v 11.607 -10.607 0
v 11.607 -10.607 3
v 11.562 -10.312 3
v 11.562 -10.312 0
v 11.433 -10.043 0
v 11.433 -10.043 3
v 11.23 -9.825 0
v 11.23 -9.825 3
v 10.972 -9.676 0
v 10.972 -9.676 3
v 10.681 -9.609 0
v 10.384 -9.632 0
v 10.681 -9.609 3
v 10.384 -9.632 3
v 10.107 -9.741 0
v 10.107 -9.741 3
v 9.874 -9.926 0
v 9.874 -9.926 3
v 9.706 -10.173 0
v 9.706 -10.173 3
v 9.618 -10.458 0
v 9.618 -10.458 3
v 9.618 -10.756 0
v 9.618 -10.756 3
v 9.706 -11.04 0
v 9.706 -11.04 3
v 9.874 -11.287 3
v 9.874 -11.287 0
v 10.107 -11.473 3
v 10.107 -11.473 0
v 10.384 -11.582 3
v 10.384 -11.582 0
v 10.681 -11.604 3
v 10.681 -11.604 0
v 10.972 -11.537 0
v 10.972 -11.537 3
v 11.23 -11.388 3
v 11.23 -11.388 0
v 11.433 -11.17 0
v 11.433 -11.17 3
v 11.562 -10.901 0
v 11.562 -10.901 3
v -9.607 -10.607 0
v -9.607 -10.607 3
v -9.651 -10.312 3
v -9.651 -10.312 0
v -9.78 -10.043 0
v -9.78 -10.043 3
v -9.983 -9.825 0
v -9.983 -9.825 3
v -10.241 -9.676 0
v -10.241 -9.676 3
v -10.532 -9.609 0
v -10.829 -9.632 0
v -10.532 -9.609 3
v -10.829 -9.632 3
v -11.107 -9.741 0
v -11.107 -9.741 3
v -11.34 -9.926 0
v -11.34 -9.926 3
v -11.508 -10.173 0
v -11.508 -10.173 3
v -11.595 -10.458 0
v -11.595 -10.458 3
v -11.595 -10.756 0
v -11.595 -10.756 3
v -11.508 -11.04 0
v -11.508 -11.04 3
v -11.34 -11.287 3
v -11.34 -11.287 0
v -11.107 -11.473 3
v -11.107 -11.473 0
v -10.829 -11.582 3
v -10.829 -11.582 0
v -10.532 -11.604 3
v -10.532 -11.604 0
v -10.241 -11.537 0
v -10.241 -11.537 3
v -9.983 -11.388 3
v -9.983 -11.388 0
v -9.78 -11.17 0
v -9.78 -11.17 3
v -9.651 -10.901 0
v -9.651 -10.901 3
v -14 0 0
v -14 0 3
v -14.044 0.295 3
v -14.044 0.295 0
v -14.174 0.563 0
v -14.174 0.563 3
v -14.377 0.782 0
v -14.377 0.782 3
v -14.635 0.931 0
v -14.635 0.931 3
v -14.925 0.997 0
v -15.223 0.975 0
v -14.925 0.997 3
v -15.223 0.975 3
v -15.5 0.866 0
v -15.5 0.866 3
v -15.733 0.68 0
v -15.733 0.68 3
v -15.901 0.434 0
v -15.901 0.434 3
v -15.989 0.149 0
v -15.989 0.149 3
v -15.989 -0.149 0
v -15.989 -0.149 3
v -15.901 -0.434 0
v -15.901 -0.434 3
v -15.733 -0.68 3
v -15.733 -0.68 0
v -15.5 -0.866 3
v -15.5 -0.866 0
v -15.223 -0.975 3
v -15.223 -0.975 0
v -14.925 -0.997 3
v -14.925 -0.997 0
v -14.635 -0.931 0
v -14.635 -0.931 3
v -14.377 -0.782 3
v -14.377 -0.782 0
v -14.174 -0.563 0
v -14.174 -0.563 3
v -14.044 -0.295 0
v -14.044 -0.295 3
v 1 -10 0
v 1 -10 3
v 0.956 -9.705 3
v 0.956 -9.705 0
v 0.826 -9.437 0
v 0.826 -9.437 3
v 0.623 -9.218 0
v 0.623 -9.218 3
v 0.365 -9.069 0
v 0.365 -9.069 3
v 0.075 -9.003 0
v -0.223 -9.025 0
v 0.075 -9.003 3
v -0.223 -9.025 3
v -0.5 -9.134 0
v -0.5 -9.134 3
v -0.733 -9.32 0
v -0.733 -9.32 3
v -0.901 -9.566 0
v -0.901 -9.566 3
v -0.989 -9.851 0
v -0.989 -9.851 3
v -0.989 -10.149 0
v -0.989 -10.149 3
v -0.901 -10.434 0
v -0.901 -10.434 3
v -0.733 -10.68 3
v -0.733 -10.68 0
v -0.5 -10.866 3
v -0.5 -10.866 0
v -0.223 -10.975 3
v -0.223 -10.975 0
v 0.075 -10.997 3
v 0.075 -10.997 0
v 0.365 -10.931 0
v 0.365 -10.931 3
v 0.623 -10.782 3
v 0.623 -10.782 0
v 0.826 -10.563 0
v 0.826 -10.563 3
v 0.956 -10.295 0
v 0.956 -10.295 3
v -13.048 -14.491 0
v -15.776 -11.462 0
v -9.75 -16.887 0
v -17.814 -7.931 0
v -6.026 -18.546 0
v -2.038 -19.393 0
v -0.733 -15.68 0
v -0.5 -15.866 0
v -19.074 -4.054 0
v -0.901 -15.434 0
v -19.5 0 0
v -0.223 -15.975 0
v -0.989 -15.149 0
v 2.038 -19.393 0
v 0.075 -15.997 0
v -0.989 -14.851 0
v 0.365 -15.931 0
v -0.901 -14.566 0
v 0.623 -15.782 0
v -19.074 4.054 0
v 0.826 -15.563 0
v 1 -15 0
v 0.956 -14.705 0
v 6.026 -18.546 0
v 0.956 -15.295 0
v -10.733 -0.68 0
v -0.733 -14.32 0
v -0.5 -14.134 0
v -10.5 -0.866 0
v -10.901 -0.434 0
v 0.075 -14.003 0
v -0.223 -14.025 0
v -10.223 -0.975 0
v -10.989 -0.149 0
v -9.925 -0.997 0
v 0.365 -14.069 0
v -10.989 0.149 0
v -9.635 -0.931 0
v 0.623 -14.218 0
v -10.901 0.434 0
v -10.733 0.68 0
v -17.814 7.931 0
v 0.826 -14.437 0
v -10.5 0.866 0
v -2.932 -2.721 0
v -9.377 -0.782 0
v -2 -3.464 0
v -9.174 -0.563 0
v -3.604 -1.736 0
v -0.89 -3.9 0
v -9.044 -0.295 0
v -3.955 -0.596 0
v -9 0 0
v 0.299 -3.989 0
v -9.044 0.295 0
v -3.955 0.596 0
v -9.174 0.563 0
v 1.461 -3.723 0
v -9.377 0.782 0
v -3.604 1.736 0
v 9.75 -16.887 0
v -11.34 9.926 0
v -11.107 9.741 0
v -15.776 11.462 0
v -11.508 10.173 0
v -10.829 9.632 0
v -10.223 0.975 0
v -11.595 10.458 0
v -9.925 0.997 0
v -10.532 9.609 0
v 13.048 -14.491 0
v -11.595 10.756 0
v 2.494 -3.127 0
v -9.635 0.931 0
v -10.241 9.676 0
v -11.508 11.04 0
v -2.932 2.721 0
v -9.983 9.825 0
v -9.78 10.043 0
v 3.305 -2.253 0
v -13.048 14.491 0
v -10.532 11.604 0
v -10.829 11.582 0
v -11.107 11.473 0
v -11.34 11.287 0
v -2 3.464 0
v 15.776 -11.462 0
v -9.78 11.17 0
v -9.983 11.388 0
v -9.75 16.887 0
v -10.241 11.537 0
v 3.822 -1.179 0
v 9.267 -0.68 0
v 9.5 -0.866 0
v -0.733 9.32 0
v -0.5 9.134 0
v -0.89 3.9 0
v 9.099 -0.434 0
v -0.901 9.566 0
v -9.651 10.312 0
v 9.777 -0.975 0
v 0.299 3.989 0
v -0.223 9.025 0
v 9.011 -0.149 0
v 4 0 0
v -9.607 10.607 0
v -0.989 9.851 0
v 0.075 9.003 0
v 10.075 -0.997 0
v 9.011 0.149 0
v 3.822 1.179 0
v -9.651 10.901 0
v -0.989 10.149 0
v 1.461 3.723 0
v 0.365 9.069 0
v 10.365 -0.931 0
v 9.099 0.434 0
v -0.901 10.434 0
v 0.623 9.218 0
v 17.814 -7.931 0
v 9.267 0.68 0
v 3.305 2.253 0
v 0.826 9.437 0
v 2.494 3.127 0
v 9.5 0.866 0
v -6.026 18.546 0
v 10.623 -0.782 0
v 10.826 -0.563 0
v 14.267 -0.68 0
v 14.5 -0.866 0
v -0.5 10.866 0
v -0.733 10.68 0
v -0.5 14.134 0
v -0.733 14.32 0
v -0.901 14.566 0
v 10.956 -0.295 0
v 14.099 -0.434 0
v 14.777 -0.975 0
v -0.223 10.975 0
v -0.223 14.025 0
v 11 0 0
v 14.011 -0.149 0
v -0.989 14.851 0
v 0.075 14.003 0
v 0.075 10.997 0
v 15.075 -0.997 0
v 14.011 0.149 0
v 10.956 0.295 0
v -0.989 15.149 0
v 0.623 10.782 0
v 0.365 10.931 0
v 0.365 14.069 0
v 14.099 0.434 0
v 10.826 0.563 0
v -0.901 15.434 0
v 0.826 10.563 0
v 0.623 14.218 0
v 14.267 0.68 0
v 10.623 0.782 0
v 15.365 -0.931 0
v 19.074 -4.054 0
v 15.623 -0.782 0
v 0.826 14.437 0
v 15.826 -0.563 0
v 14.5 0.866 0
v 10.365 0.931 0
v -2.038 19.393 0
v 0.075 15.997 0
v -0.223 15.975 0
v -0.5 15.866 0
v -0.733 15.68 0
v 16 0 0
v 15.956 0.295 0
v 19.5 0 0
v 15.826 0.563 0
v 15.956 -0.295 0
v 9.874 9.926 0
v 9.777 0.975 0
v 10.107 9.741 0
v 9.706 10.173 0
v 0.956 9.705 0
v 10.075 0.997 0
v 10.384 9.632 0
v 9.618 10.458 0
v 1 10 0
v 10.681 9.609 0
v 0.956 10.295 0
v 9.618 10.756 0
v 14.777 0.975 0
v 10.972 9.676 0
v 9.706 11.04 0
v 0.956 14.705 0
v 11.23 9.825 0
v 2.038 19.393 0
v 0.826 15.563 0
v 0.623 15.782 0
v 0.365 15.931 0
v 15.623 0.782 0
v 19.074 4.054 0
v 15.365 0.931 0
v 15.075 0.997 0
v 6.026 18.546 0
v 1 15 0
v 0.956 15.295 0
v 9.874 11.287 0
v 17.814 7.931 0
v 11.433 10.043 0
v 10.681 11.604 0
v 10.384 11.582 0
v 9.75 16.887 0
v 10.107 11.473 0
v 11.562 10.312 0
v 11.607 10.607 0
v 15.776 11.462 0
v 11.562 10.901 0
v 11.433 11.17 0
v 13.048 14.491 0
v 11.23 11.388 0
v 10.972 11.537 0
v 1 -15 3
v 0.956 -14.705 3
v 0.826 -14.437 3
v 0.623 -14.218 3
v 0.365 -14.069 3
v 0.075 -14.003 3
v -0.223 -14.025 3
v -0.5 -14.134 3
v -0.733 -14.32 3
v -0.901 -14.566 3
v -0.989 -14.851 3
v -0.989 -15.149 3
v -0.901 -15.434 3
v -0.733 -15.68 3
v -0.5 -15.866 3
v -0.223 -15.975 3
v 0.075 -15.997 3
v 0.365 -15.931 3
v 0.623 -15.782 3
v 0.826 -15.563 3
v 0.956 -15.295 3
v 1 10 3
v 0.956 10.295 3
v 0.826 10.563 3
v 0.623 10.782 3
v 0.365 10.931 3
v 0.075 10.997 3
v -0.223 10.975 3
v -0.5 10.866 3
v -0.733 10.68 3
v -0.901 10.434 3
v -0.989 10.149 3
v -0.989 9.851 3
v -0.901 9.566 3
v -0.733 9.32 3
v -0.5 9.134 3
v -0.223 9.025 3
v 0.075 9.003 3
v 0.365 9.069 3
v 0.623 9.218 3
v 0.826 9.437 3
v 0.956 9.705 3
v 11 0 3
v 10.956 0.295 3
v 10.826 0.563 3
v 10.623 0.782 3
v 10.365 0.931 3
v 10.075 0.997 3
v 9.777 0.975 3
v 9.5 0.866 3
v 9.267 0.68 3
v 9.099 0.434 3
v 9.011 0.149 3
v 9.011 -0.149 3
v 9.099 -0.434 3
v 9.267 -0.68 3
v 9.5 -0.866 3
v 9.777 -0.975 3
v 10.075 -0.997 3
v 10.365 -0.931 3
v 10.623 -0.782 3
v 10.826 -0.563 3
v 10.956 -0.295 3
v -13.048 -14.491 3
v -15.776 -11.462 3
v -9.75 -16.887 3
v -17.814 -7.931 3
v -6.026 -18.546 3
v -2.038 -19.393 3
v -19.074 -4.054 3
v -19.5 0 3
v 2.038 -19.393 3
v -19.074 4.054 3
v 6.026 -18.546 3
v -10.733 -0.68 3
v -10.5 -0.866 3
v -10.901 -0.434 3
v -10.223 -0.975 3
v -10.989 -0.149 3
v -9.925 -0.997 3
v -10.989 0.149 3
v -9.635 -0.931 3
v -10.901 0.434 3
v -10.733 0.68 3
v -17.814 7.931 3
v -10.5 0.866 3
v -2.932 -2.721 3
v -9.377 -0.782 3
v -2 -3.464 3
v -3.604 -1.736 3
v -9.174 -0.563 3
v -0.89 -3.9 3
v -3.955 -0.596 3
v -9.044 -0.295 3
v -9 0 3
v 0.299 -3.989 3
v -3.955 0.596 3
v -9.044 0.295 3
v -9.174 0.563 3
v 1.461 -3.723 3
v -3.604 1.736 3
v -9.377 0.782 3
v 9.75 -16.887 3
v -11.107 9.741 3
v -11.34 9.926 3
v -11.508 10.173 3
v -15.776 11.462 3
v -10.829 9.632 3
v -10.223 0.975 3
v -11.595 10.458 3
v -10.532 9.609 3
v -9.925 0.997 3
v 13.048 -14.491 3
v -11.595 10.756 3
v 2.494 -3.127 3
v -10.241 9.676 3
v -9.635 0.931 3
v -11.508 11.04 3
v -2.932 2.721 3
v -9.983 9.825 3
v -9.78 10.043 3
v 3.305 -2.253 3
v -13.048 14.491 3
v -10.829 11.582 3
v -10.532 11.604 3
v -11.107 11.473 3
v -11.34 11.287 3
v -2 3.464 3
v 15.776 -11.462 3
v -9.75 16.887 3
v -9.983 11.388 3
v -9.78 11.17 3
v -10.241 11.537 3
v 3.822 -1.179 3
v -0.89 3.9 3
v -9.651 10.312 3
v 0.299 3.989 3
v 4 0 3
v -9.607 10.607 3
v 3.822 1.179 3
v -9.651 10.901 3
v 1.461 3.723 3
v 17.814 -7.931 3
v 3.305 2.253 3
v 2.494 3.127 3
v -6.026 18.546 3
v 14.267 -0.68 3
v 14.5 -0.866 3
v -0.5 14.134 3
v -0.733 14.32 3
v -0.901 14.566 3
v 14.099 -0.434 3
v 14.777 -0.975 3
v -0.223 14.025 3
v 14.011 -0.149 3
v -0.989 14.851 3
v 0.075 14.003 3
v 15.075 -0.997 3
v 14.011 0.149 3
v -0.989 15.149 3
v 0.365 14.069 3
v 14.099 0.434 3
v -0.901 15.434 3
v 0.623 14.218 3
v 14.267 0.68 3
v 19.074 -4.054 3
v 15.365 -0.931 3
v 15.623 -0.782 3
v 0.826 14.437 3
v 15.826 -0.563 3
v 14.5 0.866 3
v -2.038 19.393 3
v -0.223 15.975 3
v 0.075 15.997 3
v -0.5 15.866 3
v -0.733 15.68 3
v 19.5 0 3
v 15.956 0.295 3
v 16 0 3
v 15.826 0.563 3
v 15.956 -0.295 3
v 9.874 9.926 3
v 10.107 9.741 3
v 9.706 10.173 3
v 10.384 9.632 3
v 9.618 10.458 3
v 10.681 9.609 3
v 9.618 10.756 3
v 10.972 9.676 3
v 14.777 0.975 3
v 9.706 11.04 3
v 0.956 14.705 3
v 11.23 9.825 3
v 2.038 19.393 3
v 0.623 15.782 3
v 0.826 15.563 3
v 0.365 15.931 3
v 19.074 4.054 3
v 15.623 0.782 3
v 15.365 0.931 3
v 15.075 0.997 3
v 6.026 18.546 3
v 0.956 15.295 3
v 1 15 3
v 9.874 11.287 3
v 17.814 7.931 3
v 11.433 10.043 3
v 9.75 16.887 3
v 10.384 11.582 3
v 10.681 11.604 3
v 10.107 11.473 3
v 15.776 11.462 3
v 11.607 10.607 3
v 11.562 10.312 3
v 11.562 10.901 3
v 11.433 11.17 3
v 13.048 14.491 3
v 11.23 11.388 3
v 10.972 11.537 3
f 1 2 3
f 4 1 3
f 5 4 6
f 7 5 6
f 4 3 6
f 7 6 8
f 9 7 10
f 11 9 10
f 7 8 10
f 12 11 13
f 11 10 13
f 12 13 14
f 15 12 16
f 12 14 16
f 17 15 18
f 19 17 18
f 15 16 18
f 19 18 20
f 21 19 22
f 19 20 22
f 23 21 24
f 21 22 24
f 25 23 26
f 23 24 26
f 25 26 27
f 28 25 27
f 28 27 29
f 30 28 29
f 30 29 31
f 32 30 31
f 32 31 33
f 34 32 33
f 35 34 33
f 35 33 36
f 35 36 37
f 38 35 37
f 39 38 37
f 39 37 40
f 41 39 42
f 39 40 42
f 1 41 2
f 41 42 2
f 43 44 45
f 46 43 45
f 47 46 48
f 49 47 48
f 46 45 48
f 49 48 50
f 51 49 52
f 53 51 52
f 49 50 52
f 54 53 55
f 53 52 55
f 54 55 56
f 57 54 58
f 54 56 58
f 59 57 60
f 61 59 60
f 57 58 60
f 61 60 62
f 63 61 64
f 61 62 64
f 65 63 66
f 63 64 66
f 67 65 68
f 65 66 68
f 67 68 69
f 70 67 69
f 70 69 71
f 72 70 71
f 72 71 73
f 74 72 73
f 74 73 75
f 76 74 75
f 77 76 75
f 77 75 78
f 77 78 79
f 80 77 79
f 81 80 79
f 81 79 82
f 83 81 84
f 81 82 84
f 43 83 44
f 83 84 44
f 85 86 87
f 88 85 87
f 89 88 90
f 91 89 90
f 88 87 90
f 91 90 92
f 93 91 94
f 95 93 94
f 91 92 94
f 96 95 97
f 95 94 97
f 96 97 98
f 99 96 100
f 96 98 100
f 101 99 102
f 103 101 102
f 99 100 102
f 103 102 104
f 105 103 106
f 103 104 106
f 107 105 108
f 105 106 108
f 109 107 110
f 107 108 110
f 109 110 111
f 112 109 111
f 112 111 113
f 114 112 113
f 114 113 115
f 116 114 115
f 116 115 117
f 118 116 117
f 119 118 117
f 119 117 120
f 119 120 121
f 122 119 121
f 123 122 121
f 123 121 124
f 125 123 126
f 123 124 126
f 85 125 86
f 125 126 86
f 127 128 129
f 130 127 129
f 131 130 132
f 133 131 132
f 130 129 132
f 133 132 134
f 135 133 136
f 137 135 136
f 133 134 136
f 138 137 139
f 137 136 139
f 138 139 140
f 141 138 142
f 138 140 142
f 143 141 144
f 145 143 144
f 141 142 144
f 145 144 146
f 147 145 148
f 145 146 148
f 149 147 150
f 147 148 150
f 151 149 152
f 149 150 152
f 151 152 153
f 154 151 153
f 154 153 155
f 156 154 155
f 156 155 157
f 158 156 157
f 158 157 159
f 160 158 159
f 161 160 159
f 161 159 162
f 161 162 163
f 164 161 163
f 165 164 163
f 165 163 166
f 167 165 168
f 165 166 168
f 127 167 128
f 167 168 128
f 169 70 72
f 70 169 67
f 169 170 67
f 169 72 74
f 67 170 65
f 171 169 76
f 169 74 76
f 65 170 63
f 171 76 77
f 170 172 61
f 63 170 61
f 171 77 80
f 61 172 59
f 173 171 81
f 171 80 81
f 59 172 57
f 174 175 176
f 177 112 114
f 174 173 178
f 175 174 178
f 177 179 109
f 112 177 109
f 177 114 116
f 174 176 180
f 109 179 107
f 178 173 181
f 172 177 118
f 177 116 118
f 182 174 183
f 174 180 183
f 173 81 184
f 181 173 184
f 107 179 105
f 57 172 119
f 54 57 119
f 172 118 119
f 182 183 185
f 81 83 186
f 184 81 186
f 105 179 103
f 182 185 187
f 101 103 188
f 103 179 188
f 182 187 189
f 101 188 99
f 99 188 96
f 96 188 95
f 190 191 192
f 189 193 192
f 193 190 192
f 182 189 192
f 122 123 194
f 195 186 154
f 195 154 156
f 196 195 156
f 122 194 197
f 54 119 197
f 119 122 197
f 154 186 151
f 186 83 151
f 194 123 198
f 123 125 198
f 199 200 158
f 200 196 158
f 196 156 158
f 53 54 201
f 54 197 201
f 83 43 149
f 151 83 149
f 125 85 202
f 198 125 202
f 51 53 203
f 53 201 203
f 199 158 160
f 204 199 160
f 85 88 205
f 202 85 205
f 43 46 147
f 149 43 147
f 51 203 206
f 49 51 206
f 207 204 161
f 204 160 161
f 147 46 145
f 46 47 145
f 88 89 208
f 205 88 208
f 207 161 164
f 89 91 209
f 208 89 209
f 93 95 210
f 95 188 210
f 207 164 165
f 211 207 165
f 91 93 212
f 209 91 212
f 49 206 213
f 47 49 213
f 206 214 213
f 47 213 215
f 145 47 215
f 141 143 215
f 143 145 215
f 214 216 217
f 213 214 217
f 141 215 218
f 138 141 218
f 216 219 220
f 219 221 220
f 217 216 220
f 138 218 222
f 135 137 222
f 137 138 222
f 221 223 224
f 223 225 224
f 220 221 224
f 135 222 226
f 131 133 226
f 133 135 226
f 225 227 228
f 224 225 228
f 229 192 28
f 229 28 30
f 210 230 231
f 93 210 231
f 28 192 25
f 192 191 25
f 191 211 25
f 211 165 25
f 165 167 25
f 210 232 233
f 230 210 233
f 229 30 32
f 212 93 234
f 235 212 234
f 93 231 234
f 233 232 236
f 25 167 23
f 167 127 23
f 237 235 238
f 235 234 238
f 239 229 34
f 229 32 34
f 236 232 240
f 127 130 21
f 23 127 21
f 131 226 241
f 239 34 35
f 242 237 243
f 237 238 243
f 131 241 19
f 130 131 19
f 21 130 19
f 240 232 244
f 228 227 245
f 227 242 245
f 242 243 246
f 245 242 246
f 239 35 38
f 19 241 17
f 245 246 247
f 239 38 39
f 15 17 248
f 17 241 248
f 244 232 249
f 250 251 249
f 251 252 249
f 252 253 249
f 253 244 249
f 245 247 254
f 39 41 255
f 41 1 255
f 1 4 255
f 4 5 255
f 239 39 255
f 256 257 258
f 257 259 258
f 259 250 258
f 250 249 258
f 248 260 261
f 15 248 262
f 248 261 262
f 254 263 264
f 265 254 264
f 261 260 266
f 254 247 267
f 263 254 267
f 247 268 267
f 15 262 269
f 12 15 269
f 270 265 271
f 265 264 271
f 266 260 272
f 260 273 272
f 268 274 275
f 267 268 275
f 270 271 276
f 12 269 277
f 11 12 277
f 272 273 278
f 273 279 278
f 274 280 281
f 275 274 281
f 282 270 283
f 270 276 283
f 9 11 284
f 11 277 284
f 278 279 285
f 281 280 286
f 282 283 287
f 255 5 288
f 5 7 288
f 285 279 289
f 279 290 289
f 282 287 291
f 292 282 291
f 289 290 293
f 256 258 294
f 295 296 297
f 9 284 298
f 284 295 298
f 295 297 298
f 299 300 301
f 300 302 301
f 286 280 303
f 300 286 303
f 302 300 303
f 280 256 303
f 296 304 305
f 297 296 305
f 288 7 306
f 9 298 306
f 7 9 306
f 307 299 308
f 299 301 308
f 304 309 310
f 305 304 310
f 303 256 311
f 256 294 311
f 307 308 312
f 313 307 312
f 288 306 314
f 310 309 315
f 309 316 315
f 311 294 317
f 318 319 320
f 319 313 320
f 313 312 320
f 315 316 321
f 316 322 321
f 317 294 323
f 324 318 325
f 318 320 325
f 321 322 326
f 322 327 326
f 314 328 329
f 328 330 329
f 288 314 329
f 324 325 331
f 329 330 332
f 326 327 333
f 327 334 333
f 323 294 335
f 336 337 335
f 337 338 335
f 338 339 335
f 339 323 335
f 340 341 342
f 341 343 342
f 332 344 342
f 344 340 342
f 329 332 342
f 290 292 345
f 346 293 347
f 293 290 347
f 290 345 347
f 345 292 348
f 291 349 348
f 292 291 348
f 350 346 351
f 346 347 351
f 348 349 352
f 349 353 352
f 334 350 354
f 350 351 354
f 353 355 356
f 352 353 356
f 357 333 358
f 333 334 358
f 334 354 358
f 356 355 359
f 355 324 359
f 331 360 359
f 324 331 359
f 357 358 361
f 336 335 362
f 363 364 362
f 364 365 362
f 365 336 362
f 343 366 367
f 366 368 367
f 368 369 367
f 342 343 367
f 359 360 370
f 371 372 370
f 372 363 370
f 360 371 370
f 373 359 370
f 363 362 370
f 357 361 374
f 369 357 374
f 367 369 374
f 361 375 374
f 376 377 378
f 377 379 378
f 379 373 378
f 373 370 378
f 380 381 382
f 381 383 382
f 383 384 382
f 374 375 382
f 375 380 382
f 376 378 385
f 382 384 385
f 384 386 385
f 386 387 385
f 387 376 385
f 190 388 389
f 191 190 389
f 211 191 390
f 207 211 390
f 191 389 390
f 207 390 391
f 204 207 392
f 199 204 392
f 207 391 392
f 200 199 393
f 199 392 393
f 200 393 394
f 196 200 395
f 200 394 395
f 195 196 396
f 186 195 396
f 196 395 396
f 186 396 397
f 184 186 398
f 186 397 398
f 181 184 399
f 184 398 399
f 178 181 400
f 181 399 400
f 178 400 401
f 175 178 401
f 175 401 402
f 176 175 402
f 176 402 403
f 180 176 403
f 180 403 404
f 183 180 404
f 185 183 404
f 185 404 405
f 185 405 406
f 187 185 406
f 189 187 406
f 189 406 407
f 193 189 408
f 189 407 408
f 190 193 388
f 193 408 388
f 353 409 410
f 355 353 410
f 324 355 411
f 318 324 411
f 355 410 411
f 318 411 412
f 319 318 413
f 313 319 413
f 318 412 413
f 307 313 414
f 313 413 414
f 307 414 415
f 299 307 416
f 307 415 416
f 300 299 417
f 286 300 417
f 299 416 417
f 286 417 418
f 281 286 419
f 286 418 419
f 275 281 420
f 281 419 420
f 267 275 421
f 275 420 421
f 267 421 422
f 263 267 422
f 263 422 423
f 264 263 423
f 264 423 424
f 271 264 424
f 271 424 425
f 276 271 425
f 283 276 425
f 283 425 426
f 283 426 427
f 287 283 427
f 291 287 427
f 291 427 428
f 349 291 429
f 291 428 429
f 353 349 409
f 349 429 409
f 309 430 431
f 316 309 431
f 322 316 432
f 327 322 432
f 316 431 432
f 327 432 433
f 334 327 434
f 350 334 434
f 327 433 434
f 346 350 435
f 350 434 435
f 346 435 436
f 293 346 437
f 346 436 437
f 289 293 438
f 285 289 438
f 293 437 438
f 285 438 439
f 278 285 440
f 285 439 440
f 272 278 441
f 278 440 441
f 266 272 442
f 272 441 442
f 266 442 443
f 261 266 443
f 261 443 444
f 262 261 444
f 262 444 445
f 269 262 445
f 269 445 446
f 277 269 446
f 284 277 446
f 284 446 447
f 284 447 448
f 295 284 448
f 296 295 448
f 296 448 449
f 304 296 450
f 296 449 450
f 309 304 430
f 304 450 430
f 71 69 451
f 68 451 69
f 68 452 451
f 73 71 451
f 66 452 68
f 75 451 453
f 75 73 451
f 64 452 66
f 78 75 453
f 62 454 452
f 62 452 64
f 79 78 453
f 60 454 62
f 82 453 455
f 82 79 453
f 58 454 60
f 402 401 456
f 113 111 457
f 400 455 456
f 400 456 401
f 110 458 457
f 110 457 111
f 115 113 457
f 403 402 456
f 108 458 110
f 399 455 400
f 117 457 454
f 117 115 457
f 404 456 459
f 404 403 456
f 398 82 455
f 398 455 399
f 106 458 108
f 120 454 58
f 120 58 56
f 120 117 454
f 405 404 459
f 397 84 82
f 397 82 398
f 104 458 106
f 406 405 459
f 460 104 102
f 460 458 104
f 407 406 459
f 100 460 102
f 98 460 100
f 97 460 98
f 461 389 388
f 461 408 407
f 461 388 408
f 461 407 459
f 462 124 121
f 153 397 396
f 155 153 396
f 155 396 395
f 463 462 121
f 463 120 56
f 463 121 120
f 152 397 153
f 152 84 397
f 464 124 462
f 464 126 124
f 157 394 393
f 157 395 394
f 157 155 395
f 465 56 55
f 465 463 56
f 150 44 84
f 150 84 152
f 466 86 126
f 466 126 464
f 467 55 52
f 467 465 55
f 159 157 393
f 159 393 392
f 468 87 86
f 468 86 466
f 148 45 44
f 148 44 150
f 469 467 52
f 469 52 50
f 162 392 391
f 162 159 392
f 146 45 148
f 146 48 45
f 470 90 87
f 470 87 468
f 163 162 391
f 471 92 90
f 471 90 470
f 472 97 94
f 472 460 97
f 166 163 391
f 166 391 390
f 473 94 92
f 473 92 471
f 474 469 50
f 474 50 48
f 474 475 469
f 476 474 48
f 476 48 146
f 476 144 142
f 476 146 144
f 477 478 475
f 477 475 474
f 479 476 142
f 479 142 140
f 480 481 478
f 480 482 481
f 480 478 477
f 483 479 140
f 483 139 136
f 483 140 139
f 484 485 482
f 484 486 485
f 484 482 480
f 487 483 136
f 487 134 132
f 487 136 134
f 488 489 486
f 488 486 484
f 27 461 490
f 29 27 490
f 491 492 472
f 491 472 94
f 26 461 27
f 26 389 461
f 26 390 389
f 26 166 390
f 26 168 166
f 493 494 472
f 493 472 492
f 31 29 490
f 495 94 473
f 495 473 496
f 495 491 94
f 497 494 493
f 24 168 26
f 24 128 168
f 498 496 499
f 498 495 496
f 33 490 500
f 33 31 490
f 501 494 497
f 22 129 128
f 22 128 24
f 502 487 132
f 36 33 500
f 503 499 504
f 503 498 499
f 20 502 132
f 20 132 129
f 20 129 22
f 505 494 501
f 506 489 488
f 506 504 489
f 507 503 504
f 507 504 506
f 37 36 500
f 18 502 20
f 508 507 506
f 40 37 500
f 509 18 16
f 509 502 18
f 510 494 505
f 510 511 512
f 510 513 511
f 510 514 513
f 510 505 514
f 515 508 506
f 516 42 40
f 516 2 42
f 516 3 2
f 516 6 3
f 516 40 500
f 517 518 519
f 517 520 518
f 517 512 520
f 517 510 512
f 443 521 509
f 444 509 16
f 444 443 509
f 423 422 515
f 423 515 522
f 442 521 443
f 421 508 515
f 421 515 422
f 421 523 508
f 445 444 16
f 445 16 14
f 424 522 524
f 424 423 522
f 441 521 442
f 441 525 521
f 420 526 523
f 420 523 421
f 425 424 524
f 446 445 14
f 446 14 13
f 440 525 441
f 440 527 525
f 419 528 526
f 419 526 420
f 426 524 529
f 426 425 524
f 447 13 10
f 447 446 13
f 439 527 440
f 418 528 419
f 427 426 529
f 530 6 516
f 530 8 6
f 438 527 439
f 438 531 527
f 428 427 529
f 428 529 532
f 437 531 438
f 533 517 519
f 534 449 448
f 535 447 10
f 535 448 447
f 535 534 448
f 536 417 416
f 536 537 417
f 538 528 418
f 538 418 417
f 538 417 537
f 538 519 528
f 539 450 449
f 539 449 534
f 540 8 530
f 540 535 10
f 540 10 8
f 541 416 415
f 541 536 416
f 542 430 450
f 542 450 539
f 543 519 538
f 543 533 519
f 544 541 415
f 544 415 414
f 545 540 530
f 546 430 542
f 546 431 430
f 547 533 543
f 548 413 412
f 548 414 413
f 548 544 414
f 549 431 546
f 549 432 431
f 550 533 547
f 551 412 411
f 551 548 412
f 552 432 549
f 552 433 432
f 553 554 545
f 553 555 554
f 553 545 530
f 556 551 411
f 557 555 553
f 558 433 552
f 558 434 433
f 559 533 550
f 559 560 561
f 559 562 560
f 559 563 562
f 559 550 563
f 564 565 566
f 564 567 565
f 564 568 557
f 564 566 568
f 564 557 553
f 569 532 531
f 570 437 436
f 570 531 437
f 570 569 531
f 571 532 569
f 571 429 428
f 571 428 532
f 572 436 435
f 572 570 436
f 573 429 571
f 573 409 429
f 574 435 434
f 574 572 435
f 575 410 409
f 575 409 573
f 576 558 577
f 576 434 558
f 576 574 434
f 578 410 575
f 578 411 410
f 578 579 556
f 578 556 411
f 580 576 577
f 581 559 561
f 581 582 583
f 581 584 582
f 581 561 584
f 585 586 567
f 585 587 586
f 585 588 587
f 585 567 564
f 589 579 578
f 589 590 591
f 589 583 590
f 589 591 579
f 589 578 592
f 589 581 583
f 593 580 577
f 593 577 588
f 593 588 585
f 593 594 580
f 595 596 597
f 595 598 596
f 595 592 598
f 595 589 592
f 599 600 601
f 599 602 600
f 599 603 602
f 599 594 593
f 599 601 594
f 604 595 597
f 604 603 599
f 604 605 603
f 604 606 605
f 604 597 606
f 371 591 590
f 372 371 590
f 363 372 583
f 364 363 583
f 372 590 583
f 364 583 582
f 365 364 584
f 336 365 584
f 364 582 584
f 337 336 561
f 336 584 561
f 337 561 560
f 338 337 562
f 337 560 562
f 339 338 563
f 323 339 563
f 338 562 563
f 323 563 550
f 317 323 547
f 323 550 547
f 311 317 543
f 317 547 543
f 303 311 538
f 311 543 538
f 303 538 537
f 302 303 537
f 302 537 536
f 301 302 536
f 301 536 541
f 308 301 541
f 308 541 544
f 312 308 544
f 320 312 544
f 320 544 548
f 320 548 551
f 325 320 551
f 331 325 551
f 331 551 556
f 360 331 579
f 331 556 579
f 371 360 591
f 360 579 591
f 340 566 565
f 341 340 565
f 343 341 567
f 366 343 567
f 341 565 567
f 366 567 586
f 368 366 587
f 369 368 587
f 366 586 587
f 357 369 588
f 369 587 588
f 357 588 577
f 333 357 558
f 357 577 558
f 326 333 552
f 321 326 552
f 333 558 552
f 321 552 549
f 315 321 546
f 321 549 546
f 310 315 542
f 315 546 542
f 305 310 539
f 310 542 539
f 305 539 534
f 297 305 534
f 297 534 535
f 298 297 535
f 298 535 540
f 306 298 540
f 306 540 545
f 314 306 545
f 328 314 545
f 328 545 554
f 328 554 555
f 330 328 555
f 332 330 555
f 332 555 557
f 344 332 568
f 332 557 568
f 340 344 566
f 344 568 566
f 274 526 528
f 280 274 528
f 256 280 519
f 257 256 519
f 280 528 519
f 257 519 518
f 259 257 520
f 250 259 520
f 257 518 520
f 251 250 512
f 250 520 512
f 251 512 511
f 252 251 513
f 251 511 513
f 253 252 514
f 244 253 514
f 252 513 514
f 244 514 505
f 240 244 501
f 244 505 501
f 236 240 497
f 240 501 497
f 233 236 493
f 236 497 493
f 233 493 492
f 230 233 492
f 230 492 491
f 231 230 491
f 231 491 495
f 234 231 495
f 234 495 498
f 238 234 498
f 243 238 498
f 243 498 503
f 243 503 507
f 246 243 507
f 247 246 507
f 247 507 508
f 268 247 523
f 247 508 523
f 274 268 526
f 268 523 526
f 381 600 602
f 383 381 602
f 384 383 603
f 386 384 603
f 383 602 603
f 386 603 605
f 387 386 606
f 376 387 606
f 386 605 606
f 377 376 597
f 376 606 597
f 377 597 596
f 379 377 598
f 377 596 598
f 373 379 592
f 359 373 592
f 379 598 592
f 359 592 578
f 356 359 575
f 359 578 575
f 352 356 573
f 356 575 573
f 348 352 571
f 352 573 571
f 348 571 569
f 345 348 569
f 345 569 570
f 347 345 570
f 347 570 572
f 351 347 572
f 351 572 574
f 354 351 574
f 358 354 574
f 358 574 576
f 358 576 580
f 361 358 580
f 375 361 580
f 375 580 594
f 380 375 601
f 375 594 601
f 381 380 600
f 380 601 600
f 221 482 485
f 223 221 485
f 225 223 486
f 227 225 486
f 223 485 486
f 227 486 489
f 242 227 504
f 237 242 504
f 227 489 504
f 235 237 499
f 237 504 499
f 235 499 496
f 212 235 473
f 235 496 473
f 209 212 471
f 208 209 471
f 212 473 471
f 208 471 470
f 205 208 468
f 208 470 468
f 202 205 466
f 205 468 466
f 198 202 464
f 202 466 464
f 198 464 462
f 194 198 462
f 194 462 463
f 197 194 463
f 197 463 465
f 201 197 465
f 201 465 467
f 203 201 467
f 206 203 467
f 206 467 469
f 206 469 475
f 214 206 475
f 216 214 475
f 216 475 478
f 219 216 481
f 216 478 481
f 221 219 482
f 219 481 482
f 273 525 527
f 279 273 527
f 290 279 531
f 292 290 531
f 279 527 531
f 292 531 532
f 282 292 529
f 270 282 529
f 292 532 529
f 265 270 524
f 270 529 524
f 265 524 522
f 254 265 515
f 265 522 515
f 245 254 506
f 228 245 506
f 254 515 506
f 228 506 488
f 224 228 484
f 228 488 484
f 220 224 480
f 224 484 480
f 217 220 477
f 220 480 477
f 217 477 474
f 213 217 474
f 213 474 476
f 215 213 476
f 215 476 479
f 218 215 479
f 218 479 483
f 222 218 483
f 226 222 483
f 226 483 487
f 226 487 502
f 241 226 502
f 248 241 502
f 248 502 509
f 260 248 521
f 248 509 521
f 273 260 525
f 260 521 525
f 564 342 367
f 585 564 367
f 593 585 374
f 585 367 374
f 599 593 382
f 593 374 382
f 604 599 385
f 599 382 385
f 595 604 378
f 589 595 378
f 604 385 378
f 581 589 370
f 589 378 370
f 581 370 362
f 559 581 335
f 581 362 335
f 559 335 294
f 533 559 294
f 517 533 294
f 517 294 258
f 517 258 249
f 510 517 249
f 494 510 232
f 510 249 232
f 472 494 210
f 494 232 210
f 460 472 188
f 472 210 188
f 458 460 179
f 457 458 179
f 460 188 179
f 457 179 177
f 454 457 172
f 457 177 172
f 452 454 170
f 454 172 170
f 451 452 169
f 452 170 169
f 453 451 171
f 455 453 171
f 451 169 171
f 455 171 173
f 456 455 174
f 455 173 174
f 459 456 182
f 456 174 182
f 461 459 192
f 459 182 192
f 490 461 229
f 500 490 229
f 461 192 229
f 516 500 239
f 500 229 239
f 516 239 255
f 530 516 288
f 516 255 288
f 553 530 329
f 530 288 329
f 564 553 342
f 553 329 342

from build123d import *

# Parameters (mm, degrees)
CROQUIS1_R              = 19.5
SALIENTE_EXTRUIR1_DEPTH = 3
CROQUIS2_R              = 1
CORTAR_EXTRUIR1_DEPTH   = 3
CROQUIS3_R              = 4
CORTAR_EXTRUIR2_DEPTH   = 3


with BuildPart() as part:
    # Croquis1 → Saliente-Extruir1 (new body)
    with BuildSketch(Plane.XY):
        Circle(CROQUIS1_R)
    extrude(amount=SALIENTE_EXTRUIR1_DEPTH)

    # Croquis2 → Cortar-Extruir1 (cut)
    with BuildSketch(Plane.XY.offset(3)):
        with Locations((0, 10)):
            Circle(CROQUIS2_R)
        with Locations((10, 0)):
            Circle(CROQUIS2_R)
        with Locations((0, -10)):
            Circle(CROQUIS2_R)
        with Locations((-10, 0)):
            Circle(CROQUIS2_R)
        with Locations((0, 15)):
            Circle(CROQUIS2_R)
        with Locations((10.606601718, 10.606601718)):
            Circle(CROQUIS2_R)
        with Locations((15, 0)):
            Circle(CROQUIS2_R)
        with Locations((10.606601718, -10.606601718)):
            Circle(CROQUIS2_R)
        with Locations((0, -15)):
            Circle(CROQUIS2_R)
        with Locations((-10.606601718, -10.606601718)):
            Circle(CROQUIS2_R)
        with Locations((-15, 0)):
            Circle(CROQUIS2_R)
        with Locations((-10.606601718, 10.606601718)):
            Circle(CROQUIS2_R)
    extrude(amount=-CORTAR_EXTRUIR1_DEPTH, mode=Mode.SUBTRACT)

    # Croquis3 → Cortar-Extruir2 (cut)
    with BuildSketch(Plane.XY.offset(3)):
        Circle(CROQUIS3_R)
    extrude(amount=-CORTAR_EXTRUIR2_DEPTH, mode=Mode.SUBTRACT)


solid = part.part
